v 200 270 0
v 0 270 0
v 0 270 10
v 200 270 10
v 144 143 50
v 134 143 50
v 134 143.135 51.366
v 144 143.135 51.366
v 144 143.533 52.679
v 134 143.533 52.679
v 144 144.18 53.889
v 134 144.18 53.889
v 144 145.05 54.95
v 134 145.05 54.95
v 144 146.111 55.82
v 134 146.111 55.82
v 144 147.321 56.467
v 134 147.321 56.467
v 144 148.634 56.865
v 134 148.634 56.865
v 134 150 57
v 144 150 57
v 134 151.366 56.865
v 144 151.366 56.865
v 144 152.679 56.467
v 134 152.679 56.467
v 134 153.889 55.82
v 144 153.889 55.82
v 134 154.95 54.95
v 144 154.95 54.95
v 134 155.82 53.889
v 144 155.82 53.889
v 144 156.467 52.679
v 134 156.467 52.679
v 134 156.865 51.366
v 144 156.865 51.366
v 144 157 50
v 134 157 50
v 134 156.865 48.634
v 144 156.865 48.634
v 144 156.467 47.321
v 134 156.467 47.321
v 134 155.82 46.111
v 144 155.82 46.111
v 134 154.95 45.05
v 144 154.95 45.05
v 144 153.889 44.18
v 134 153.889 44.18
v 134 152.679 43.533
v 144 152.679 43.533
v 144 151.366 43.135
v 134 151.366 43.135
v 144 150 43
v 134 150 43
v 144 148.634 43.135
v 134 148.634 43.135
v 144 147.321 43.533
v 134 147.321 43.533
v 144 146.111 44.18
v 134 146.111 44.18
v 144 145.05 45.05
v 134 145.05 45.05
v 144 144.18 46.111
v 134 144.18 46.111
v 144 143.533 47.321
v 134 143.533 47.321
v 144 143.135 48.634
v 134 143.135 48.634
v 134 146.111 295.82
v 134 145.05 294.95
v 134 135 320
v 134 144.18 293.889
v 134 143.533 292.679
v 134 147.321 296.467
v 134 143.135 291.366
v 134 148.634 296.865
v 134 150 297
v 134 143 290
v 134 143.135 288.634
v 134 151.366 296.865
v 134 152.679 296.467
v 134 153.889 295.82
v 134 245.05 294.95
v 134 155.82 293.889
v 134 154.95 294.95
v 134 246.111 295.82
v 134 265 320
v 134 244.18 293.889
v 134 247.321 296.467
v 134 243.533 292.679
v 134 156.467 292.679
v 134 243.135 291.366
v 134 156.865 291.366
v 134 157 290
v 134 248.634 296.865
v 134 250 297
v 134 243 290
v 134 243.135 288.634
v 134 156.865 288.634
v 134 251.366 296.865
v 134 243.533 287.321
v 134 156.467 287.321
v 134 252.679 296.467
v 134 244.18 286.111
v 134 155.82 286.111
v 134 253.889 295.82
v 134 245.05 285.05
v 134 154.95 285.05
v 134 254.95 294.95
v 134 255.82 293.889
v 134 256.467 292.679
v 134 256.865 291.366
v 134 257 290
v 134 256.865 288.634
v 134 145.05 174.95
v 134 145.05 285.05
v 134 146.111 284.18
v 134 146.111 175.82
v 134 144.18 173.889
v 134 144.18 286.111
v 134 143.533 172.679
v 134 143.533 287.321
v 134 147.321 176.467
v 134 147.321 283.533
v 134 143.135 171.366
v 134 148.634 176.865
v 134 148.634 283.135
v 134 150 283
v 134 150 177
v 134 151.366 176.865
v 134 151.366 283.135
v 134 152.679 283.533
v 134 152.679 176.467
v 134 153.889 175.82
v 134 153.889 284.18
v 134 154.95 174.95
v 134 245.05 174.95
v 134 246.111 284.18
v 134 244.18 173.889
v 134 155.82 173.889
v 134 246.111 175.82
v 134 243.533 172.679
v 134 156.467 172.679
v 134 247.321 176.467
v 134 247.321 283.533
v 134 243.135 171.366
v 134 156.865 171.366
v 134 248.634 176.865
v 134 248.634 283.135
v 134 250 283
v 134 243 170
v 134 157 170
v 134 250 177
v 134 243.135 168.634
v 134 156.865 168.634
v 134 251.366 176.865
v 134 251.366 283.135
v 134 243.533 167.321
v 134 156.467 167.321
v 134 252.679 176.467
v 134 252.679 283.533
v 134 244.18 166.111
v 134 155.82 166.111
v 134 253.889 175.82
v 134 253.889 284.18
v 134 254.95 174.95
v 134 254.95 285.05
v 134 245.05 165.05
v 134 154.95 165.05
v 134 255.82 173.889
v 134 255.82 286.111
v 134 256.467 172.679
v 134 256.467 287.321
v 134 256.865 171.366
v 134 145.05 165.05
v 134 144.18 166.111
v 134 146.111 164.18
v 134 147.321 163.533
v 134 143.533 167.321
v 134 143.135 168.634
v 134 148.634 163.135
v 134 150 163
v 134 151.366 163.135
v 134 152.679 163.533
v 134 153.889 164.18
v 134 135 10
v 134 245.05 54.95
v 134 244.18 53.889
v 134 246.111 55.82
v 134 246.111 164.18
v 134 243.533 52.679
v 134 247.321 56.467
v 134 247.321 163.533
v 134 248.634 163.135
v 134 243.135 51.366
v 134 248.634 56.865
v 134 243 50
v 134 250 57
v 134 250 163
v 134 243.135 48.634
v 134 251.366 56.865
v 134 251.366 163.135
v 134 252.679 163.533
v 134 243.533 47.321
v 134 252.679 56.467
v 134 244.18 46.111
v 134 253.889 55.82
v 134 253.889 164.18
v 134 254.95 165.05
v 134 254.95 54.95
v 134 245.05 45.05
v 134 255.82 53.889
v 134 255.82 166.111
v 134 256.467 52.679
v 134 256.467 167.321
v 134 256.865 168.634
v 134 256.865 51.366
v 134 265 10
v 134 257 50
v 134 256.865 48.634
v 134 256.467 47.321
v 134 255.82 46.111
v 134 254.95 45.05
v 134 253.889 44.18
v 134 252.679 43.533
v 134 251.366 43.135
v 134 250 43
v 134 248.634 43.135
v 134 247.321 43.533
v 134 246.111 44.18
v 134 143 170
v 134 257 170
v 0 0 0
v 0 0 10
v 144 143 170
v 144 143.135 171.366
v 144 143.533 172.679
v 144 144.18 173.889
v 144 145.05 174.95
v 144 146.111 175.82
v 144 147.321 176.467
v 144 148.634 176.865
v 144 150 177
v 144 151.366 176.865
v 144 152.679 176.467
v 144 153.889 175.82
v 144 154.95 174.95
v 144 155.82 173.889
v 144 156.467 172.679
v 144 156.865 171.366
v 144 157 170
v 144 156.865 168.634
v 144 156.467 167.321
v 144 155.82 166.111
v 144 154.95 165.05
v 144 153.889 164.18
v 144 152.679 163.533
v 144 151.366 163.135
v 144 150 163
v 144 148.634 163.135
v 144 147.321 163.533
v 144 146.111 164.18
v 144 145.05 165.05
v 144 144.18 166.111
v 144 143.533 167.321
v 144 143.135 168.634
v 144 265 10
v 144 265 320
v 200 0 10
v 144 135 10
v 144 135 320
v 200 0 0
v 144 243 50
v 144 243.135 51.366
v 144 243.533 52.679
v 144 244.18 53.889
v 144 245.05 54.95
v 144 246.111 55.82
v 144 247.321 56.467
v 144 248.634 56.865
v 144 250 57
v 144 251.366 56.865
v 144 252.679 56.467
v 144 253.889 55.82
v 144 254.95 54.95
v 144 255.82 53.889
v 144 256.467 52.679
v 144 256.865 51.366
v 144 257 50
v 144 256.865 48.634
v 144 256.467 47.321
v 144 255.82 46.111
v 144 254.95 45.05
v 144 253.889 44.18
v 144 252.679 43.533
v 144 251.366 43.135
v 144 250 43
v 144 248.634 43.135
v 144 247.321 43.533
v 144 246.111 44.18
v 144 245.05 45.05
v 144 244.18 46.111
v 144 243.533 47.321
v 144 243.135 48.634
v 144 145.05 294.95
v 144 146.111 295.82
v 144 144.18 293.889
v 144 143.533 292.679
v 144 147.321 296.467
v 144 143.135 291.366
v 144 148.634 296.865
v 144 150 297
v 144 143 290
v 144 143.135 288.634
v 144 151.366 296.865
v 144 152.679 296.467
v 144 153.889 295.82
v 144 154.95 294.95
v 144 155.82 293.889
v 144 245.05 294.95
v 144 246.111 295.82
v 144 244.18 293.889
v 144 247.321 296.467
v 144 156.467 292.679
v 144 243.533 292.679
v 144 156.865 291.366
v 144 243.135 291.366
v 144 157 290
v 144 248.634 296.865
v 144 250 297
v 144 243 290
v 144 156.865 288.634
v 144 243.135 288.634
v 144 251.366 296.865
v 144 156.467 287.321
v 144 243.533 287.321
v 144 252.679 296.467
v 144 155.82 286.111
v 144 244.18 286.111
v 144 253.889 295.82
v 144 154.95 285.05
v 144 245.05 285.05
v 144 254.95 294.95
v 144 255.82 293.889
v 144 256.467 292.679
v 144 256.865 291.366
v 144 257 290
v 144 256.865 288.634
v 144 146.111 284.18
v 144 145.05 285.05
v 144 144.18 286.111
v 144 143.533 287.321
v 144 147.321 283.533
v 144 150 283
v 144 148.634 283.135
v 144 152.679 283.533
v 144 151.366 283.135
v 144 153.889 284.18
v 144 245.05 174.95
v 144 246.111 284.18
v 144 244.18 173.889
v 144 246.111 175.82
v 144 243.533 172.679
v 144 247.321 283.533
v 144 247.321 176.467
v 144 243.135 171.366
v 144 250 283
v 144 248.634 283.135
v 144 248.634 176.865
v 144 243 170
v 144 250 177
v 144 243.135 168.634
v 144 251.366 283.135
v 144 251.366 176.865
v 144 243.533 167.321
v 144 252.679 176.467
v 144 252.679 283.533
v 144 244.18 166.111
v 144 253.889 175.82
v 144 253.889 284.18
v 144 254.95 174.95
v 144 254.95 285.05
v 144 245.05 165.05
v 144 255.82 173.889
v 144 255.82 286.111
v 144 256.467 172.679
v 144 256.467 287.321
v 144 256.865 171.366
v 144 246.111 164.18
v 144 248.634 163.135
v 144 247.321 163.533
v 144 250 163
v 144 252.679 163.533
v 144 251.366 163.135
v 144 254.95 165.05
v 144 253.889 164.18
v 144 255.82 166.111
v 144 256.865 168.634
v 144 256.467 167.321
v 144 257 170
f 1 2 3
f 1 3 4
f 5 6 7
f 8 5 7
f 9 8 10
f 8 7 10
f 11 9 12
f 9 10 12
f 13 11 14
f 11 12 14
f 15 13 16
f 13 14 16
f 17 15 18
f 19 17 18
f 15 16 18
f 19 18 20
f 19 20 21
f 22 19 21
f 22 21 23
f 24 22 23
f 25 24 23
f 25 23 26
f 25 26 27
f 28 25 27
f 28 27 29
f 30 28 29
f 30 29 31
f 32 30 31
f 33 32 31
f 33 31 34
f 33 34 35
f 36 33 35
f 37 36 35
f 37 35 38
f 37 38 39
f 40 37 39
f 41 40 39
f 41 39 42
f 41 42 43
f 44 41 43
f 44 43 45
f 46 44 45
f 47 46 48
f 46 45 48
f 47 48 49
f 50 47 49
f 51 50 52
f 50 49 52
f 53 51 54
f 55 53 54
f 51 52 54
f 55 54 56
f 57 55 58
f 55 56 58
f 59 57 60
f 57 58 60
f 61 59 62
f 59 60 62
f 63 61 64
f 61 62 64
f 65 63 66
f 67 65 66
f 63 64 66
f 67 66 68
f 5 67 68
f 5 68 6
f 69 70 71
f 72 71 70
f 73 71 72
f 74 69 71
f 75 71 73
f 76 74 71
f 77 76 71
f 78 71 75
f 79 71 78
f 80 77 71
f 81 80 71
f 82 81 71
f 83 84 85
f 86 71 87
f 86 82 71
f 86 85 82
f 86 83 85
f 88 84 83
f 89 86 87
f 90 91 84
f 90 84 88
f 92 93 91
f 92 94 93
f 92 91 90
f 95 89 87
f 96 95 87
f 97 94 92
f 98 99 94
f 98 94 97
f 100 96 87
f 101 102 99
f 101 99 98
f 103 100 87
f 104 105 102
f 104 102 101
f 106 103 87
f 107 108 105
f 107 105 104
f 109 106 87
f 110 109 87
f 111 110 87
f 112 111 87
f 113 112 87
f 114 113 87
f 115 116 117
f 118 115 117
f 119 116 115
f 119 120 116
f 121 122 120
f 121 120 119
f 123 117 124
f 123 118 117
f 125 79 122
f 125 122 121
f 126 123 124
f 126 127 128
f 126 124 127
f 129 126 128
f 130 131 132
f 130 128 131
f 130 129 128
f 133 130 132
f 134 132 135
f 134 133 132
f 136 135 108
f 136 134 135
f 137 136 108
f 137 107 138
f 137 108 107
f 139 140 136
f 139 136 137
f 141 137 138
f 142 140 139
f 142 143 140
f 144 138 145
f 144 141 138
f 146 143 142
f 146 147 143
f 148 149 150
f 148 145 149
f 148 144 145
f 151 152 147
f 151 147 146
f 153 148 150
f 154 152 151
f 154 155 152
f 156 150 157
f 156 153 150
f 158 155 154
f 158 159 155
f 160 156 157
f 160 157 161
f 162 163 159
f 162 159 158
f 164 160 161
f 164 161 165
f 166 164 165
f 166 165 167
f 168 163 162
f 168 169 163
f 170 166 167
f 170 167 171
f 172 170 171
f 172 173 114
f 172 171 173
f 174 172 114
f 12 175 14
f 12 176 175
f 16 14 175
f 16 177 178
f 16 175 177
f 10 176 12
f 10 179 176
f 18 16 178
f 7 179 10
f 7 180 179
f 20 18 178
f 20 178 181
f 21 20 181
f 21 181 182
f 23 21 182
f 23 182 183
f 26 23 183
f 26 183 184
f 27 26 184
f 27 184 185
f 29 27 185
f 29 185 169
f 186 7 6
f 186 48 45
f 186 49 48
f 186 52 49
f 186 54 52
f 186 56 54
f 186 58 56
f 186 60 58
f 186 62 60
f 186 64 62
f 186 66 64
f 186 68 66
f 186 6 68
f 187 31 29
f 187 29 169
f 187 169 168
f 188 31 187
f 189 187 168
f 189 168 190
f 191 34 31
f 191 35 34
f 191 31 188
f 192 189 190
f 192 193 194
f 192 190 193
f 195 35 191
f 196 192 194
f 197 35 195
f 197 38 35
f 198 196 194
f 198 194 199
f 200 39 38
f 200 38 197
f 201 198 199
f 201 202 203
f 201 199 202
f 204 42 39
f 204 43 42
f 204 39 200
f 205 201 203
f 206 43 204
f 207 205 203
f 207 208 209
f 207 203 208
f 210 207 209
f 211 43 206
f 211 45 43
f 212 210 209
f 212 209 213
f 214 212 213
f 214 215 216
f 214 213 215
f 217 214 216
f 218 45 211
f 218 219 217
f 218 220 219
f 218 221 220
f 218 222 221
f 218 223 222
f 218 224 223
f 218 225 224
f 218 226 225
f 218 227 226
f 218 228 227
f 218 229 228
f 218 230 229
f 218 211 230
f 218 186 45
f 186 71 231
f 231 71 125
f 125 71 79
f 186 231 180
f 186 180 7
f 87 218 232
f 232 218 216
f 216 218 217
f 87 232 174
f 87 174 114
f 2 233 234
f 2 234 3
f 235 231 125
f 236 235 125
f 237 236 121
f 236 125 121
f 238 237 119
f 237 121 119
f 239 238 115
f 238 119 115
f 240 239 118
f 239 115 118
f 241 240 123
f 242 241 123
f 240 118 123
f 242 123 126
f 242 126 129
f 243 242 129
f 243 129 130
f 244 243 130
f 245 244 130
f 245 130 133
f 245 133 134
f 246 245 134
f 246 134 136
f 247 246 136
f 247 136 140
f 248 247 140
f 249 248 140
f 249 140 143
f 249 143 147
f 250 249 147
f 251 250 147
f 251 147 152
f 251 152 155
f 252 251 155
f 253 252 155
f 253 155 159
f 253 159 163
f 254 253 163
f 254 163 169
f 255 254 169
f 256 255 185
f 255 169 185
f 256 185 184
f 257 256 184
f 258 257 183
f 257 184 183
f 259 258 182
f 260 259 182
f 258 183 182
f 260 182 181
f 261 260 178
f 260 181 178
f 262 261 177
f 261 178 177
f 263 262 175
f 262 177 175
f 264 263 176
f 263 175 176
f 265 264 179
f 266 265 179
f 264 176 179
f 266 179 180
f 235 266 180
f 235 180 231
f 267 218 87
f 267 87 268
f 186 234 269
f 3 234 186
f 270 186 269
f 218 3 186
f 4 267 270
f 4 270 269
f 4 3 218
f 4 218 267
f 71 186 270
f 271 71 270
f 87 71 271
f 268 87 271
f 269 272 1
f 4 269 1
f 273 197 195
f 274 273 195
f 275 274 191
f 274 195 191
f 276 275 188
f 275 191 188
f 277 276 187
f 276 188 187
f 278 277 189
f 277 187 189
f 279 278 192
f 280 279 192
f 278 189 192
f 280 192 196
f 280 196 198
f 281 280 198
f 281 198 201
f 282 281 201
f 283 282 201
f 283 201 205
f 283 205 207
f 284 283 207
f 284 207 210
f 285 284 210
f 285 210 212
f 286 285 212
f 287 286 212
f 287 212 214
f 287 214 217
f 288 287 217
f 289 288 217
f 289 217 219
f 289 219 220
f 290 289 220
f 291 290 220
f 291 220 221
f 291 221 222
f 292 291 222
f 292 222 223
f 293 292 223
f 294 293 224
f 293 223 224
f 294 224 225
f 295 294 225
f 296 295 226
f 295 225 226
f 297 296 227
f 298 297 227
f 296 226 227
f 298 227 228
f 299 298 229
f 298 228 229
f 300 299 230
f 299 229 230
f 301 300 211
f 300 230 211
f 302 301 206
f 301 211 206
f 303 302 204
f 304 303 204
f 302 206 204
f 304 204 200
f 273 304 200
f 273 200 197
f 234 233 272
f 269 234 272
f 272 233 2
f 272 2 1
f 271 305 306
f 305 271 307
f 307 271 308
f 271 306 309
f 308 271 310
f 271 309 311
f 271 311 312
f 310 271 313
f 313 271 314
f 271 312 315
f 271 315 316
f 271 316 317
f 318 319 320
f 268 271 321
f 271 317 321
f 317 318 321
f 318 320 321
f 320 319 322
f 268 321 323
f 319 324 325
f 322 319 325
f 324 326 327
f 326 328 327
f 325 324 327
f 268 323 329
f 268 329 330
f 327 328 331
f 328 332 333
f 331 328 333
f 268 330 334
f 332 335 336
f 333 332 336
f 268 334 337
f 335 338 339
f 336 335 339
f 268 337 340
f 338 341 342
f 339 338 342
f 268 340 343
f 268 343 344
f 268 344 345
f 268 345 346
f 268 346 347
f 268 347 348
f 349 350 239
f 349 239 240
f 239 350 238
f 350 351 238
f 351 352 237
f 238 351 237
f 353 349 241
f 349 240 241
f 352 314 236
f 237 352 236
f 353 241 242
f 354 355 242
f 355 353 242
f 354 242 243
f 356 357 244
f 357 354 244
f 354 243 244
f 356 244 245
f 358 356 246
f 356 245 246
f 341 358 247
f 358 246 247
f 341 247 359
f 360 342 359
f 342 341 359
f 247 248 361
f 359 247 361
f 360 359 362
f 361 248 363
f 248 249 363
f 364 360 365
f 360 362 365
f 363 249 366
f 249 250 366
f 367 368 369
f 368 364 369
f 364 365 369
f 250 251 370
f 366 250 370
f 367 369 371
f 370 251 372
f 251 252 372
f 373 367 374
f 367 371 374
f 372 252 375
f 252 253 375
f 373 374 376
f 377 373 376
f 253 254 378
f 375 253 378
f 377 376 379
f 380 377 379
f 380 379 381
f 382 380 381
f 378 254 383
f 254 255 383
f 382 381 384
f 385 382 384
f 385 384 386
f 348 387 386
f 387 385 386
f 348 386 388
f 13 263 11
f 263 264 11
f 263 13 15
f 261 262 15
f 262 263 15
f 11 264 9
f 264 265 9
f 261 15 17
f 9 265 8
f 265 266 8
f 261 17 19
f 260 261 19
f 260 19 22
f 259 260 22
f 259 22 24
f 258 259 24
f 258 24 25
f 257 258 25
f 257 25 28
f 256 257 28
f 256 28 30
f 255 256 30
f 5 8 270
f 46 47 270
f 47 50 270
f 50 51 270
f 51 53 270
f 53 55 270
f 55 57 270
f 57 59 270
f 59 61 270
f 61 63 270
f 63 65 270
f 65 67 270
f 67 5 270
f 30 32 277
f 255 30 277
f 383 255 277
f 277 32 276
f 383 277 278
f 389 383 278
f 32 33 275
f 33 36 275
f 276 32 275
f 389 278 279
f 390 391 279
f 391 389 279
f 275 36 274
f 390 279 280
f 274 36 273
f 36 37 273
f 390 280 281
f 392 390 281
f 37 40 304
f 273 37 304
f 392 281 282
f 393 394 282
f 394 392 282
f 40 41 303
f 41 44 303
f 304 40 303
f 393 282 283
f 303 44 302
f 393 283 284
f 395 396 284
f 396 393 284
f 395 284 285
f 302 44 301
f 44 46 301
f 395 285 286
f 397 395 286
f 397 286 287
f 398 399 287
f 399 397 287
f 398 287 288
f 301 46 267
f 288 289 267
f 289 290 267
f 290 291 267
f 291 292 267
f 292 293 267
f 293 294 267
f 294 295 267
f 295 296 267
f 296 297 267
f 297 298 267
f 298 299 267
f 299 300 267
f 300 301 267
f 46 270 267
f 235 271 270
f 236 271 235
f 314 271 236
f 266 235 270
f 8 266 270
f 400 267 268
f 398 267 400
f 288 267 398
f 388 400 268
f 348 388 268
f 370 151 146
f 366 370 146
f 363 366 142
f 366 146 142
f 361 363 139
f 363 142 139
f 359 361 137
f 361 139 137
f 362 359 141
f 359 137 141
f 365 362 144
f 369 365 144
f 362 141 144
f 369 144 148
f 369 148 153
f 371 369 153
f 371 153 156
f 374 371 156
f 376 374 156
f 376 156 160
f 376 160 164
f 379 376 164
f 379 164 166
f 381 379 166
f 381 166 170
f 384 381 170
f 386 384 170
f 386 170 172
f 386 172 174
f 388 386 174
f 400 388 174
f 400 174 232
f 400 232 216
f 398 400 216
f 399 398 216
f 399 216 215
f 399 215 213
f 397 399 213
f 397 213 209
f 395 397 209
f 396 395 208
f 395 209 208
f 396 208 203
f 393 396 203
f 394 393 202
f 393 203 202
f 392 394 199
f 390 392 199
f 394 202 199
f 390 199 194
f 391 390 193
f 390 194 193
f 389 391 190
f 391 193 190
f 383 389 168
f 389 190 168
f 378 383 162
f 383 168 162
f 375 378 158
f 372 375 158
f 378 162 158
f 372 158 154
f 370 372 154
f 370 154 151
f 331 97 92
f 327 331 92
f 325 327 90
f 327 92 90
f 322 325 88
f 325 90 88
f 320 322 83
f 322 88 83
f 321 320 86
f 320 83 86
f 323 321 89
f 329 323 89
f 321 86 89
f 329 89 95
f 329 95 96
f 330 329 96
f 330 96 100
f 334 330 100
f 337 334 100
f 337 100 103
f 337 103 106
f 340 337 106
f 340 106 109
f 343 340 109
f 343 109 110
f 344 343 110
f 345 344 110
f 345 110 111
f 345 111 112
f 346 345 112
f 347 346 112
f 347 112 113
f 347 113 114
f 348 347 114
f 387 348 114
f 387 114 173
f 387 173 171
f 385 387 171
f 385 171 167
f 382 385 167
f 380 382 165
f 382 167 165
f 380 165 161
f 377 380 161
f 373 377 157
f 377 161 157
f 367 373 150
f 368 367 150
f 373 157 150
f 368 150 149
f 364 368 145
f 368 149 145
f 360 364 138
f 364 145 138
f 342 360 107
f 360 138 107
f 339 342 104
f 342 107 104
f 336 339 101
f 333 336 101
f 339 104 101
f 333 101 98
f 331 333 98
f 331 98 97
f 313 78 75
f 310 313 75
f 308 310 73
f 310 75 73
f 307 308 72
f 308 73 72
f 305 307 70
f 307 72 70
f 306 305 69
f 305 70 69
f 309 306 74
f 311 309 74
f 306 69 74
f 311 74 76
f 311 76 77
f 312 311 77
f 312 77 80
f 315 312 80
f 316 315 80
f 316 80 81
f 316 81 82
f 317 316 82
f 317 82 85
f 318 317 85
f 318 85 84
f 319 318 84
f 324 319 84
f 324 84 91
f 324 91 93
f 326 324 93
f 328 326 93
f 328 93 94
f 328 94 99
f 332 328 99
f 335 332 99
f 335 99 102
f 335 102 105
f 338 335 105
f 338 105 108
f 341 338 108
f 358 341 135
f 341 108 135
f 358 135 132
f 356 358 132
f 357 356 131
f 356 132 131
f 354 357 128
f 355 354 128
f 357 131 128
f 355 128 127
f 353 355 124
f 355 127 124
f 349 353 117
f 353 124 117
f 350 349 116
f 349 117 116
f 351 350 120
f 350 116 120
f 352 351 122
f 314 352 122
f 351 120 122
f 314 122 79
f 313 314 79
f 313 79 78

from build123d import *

# Parameters (mm, degrees)
F0_W     = 200
F0_H     = 270
F1_DEPTH = 10
F2_W     = 10
F2_H     = 130
F3_DEPTH = 310
F5_D     = 14


with BuildPart() as f1:
    # F0 (on Top) → F1 (new body)
    with BuildSketch(Plane.XY):
        with Locations((100, 135)):
            Rectangle(F0_W, F0_H)
    extrude(amount=F1_DEPTH)

    # F2 (on face) → F3 (join)
    with BuildSketch(Plane.XY.offset(10)):
        with Locations((139, 200)):
            Rectangle(F2_W, F2_H)
    extrude(amount=F3_DEPTH)

    # F5 (through all)
    with Locations(Plane.YZ.offset(144)):
        with Locations((150, 290), (250, 290), (250, 170), (150, 170), (150, 50), (250, 50)):
            Hole(F5_D / 2)


solid = f1.part
